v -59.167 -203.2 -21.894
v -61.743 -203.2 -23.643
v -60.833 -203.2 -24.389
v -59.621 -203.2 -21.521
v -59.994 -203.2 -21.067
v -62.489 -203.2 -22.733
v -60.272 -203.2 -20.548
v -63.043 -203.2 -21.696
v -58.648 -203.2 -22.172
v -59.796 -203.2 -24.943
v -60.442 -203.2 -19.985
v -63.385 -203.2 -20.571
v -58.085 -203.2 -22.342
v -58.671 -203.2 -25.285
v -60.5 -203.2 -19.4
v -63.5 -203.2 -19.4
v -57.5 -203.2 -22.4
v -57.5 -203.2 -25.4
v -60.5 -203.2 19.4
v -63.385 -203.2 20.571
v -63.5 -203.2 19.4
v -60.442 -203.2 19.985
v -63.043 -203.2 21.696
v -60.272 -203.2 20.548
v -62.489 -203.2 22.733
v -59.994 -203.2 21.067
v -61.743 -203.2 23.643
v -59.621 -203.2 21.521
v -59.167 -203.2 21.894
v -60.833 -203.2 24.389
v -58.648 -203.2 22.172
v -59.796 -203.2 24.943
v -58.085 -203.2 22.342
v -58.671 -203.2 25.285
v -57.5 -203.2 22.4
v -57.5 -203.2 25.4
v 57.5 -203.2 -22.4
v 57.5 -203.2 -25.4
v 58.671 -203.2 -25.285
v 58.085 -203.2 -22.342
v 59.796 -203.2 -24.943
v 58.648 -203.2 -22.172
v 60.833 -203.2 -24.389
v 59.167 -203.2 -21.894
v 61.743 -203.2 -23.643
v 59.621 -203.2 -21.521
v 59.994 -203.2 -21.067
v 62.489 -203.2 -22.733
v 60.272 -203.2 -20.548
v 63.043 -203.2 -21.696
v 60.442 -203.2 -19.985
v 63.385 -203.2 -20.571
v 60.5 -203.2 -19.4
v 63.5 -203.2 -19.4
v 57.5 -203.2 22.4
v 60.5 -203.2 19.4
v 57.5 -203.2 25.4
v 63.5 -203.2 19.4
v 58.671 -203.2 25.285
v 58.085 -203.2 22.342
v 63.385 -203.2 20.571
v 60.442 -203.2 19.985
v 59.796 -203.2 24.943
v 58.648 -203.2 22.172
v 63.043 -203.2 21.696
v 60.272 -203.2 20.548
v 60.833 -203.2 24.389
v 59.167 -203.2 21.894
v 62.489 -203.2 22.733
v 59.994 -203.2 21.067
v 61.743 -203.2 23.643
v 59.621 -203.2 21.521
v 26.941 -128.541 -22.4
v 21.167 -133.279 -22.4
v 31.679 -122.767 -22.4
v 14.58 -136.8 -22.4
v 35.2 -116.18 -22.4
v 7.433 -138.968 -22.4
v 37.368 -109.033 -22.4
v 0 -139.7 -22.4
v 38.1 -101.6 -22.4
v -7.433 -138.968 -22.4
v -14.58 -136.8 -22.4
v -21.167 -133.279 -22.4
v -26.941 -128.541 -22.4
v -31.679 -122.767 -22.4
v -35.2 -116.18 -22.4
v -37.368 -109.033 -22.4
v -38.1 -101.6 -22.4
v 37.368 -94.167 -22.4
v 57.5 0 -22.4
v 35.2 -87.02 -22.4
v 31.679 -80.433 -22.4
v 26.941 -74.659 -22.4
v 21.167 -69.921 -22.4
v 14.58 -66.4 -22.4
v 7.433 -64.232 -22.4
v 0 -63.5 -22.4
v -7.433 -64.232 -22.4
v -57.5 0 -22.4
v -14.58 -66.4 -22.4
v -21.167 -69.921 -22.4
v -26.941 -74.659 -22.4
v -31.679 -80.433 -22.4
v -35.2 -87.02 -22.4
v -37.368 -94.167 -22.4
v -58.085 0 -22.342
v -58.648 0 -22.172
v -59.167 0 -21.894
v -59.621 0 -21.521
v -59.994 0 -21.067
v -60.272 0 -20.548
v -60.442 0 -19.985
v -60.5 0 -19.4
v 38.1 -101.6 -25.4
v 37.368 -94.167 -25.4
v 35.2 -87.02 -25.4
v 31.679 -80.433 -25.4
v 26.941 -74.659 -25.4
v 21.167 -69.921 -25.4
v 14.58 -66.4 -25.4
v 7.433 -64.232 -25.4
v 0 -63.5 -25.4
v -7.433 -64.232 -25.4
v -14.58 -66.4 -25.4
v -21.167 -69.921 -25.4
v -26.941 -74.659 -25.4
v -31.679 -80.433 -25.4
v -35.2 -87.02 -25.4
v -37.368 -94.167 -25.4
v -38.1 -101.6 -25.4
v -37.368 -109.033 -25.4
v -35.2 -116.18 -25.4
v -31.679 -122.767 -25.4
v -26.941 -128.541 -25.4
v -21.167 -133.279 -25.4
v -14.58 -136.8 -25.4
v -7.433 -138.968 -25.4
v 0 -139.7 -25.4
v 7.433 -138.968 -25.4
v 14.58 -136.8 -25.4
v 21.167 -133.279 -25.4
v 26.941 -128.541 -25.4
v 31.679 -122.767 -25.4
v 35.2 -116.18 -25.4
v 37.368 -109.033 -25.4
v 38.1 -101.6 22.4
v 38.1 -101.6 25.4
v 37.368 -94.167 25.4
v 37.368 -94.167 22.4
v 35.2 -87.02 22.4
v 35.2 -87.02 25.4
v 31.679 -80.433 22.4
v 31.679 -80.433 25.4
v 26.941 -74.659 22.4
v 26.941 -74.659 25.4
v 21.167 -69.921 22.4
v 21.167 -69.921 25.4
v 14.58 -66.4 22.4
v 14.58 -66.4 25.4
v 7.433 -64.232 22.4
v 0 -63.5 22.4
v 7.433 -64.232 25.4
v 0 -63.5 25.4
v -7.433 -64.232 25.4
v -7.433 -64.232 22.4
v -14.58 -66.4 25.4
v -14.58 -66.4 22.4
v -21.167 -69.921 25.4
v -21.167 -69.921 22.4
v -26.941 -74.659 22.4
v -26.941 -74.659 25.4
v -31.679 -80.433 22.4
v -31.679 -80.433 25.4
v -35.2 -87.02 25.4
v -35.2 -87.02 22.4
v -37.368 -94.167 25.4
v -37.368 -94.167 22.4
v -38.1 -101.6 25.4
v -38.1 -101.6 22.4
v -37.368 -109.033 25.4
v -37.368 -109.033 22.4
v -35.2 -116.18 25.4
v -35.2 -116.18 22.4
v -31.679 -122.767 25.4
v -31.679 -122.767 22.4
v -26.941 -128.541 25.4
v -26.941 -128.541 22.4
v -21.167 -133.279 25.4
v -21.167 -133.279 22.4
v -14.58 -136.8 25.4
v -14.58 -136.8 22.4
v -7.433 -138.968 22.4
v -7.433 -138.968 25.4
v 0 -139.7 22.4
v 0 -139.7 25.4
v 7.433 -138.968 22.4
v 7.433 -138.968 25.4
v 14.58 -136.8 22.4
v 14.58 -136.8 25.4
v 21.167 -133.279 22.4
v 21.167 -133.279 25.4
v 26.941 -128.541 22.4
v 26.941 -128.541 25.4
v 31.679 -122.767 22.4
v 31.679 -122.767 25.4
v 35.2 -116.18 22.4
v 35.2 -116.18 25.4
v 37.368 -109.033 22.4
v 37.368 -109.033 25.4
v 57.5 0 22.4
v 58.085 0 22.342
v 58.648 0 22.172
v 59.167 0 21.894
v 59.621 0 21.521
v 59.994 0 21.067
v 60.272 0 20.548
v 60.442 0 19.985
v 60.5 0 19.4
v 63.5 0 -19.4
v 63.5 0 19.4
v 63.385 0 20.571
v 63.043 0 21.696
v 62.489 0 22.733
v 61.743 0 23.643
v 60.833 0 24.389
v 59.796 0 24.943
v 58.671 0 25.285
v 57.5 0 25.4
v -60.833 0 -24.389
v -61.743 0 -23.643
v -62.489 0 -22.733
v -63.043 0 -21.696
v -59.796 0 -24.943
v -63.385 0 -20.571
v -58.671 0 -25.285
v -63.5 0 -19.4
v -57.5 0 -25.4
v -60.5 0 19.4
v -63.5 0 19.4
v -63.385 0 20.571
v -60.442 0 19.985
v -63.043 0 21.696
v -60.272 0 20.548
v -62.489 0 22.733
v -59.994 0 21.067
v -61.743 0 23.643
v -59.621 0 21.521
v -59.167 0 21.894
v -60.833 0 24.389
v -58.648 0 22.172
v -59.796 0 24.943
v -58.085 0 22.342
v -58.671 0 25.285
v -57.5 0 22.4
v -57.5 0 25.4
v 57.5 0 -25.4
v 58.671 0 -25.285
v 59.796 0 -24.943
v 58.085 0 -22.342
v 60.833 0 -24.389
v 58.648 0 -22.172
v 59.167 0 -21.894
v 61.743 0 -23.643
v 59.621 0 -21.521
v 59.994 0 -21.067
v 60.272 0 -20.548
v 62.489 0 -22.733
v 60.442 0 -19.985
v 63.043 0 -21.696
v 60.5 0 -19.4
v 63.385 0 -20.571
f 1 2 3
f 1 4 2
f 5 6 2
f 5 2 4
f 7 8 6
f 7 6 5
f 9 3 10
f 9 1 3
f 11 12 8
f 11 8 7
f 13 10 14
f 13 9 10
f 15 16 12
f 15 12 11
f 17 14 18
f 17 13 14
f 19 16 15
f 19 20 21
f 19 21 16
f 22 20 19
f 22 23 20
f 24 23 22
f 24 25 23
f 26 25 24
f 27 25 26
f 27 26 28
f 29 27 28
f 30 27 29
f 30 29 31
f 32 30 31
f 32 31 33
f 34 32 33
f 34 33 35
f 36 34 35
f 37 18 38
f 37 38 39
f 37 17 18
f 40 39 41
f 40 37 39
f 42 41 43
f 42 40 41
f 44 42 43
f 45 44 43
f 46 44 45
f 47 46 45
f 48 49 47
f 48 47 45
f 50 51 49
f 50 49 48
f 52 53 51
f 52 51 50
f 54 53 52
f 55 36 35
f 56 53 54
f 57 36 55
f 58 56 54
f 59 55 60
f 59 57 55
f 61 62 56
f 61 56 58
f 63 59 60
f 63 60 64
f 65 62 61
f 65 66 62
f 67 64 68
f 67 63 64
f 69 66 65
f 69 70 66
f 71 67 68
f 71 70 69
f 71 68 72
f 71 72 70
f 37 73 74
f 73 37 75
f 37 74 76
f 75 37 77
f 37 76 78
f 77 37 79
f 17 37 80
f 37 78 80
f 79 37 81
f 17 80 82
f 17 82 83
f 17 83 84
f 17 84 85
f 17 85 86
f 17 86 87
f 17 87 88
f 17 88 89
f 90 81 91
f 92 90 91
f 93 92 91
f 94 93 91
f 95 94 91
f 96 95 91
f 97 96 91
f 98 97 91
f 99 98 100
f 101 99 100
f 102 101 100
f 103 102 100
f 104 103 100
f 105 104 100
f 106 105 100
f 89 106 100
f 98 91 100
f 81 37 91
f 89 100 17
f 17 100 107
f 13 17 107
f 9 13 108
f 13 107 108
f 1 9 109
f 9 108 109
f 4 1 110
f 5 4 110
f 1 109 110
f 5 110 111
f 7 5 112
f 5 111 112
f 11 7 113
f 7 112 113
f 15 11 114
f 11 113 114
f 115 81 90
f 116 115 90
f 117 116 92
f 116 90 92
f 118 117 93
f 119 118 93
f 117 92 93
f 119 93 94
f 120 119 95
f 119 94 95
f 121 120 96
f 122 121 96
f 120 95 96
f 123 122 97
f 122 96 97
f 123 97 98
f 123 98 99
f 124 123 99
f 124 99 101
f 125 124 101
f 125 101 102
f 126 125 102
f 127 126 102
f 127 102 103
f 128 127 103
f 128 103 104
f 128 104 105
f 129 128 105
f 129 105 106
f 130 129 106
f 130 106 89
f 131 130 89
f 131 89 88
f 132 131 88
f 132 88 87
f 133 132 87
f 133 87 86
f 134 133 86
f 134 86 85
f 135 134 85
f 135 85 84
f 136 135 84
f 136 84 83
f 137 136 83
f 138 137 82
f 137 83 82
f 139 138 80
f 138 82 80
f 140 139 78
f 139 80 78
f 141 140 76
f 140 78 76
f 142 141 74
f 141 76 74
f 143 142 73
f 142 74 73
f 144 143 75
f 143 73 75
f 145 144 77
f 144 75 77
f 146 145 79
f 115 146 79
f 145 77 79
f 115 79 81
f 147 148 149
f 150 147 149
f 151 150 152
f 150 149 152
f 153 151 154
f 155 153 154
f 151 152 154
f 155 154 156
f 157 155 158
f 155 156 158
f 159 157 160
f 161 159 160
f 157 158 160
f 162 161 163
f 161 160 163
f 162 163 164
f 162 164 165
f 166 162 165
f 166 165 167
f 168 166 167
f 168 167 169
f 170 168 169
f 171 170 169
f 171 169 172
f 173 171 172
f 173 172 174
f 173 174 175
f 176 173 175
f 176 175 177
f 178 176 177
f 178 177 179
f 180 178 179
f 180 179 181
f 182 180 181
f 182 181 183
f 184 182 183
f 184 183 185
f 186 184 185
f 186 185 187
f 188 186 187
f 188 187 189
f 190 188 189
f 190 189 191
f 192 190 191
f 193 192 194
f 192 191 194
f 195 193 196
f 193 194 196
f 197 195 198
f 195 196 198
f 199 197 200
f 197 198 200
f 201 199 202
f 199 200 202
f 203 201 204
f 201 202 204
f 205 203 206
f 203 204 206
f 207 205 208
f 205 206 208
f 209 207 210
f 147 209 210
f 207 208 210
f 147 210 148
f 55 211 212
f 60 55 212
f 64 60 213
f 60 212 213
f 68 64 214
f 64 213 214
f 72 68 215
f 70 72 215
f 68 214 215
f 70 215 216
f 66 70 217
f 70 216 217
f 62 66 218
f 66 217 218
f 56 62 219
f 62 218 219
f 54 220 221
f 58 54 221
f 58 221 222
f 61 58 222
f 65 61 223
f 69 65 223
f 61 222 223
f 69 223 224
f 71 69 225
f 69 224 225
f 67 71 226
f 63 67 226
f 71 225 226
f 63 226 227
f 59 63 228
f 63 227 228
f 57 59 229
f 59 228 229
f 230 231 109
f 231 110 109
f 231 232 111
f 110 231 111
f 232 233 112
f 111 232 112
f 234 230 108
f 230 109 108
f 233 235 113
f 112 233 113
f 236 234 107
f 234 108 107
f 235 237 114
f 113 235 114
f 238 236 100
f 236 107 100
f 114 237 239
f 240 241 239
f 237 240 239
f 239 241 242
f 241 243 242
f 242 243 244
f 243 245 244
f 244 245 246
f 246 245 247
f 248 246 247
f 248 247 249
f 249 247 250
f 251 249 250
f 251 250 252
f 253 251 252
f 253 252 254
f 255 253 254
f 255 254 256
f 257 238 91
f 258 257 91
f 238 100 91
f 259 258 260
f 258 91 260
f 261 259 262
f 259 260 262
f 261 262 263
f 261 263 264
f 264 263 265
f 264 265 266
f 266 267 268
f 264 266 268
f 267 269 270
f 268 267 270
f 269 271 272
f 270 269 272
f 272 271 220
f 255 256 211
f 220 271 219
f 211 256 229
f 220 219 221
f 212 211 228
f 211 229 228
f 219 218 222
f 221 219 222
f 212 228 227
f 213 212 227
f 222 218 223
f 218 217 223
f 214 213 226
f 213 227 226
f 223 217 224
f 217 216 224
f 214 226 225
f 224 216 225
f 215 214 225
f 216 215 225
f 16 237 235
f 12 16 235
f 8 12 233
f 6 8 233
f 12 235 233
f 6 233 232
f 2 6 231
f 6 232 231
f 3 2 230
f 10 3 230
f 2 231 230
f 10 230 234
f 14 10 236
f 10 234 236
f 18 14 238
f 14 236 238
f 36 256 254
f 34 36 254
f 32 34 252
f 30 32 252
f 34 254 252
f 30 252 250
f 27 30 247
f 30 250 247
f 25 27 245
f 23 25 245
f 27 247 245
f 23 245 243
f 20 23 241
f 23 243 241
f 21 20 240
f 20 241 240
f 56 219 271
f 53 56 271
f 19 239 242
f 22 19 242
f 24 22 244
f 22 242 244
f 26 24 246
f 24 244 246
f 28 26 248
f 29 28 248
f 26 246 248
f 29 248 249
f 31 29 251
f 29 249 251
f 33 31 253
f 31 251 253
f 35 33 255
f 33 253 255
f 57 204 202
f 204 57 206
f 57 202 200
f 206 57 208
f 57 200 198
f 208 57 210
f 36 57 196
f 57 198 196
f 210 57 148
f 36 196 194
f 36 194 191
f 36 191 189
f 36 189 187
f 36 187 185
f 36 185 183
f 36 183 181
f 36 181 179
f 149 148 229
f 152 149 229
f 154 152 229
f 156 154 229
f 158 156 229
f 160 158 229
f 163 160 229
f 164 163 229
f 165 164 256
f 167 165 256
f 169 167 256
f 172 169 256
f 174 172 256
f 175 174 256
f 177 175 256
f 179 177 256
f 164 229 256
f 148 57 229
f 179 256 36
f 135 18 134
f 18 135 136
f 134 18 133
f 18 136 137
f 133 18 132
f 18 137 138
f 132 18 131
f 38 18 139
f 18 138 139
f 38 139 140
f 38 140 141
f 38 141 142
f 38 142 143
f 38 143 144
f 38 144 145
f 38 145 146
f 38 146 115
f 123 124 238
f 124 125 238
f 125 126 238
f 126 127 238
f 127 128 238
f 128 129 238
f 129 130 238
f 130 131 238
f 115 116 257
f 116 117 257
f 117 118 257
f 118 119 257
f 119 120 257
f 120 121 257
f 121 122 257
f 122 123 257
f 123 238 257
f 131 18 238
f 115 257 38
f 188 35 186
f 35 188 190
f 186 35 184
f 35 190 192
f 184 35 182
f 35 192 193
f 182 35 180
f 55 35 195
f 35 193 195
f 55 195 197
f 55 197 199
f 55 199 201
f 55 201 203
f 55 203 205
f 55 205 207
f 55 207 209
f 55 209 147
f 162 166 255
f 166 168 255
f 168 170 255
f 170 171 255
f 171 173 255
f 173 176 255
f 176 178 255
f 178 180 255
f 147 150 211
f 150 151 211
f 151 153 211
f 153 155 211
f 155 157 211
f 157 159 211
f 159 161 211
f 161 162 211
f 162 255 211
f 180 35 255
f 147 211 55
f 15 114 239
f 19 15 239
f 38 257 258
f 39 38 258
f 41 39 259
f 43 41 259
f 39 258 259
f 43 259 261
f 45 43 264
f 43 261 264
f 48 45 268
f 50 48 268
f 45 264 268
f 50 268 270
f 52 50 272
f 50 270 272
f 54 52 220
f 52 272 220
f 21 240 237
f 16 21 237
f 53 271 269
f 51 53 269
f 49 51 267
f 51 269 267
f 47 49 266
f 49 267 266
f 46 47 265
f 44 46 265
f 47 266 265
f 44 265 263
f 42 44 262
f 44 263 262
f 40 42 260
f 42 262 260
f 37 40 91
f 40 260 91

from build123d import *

# Parameters (mm, degrees)
F1_DEPTH = 203.2
F2_R     = 38.1
F3_DEPTH = 50.801


with BuildPart() as f1:
    # F0 (on Front) → F1 (new body)
    with BuildSketch(Plane.XZ):
        with BuildLine():
            Line((-57.5, -25.4), (57.5, -25.4))
            ThreePointArc((57.5, -25.4), (61.742641, -23.642641), (63.5, -19.4))
            Line((63.5, -19.4), (63.5, 19.4))
            ThreePointArc((63.5, 19.4), (61.742641, 23.642641), (57.5, 25.4))
            Line((57.5, 25.4), (-57.5, 25.4))
            ThreePointArc((-57.5, 25.4), (-61.742641, 23.642641), (-63.5, 19.4))
            Line((-63.5, 19.4), (-63.5, -19.4))
            ThreePointArc((-63.5, -19.4), (-61.742641, -23.642641), (-57.5, -25.4))
        make_face()
        with BuildLine():
            ThreePointArc((60.5, -19.4), (59.62132, -21.52132), (57.5, -22.4))
            Line((57.5, -22.4), (-57.5, -22.4))
            ThreePointArc((-57.5, -22.4), (-59.62132, -21.52132), (-60.5, -19.4))
            Line((-60.5, -19.4), (-60.5, 19.4))
            ThreePointArc((-60.5, 19.4), (-59.62132, 21.52132), (-57.5, 22.4))
            Line((-57.5, 22.4), (57.5, 22.4))
            ThreePointArc((57.5, 22.4), (59.62132, 21.52132), (60.5, 19.4))
            Line((60.5, 19.4), (60.5, -19.4))
        make_face(mode=Mode.SUBTRACT)
    extrude(amount=F1_DEPTH)

    # F2 (on face) → F3 (cut, through all)
    with BuildSketch(Plane.XY.offset(25.4)):
        with Locations((0, -101.6)):
            Circle(F2_R)
    extrude(amount=-F3_DEPTH, mode=Mode.SUBTRACT)


solid = f1.part
